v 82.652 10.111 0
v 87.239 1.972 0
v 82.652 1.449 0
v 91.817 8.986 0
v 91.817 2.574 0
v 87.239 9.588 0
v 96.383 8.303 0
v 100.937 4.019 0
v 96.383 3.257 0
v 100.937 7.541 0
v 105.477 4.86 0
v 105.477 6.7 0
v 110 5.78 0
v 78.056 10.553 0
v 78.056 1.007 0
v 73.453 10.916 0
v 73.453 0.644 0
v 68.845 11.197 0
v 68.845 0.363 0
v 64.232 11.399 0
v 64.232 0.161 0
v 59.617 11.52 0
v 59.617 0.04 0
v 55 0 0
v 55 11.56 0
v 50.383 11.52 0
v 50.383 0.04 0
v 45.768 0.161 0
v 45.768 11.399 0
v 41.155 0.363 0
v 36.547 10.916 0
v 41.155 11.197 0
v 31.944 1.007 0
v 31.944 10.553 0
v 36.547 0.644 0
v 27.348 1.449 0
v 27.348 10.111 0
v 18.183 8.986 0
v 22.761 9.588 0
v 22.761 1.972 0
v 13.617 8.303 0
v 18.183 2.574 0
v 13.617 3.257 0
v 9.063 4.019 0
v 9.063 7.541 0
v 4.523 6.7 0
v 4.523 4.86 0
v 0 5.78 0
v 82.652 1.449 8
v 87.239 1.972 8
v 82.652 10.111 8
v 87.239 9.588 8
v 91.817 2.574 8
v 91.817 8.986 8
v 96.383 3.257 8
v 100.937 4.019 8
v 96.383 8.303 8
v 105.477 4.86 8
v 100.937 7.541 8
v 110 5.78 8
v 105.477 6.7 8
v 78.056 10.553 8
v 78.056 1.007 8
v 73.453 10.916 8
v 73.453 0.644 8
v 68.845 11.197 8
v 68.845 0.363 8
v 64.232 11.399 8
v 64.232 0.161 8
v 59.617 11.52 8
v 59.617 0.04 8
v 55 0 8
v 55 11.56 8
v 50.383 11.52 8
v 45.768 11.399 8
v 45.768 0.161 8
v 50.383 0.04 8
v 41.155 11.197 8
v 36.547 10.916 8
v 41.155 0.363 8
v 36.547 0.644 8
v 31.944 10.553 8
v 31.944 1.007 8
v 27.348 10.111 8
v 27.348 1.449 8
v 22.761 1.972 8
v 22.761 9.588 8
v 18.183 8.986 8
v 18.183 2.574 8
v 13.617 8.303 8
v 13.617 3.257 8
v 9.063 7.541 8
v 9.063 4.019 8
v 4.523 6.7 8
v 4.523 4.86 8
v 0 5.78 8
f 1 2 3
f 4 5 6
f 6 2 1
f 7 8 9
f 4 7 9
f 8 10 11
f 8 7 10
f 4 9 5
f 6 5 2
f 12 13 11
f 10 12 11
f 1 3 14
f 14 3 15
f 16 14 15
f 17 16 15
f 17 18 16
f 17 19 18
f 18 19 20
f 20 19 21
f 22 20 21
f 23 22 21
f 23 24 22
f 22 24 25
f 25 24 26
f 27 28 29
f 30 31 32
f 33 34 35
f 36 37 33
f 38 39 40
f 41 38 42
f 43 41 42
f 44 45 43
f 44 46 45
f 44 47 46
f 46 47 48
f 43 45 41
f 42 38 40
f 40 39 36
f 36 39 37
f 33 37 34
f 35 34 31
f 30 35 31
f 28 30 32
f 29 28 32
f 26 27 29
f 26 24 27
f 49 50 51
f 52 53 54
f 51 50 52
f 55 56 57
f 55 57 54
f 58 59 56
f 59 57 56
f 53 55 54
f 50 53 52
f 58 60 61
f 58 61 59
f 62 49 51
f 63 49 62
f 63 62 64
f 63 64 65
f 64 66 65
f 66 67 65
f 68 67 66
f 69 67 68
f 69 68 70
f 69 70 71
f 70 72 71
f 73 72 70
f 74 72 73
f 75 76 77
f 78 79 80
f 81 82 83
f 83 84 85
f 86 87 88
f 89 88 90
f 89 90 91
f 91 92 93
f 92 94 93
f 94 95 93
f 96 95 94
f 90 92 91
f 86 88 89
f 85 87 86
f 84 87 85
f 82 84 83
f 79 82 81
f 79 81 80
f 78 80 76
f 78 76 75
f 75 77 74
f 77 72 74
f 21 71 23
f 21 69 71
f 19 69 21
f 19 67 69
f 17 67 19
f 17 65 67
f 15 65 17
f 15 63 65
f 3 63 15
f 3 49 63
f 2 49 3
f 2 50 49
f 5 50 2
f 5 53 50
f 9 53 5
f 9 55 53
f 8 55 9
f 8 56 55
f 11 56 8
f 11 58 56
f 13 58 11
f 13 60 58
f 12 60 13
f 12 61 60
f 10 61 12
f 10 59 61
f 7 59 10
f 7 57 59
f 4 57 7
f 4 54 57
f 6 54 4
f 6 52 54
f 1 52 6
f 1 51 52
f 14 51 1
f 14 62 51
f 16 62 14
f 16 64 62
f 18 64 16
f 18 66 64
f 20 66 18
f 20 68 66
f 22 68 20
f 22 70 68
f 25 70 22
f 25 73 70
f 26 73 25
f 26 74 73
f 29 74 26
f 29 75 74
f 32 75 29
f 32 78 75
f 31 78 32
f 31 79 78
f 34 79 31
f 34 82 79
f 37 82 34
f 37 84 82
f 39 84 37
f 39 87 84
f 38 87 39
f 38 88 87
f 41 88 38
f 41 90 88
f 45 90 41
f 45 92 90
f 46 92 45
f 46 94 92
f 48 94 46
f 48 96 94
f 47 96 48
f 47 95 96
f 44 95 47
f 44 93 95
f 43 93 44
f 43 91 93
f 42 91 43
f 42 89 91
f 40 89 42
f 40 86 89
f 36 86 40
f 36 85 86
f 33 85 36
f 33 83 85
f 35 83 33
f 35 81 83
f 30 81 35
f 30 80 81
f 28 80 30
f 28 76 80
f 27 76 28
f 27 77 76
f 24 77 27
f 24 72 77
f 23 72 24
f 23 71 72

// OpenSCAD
$fn = 32;

// ----------------------------------------------------------------------
// Arc profile plate: lens, 48 points
// ----------------------------------------------------------------------

// --- parameters (mm) ---
lens_chord = 110;         // chord length of the lens, X
arc_r = 264.54;           // radius of both arcs
arc_angle = 24;           // angle of each arc, degrees
sagitta = 5.78;           // bulge of each arc (half the lens height)
arc_step = 1;             // sampling step of the arcs, degrees
plate_t = 8;              // plate thickness, Z
fit_tol = 0.02;           // declared fit tolerance (prompt contract)
free_tol = 0.2;           // declared free tolerance (prompt contract)

bbox_y = 2 * sagitta;  // full lens height

profile = [[110, 5.78], [105.477, 6.7], [100.937, 7.541], [96.383, 8.303], [91.817, 8.986], [87.239, 9.588], [82.652, 10.111], [78.056, 10.553], [73.453, 10.916], [68.845, 11.197], [64.232, 11.399], [59.617, 11.52], [55, 11.56], [50.383, 11.52], [45.768, 11.399], [41.155, 11.197], [36.547, 10.916], [31.944, 10.553], [27.348, 10.111], [22.761, 9.588], [18.183, 8.986], [13.617, 8.303], [9.063, 7.541], [4.523, 6.7], [0, 5.78], [4.523, 4.86], [9.063, 4.019], [13.617, 3.257], [18.183, 2.574], [22.761, 1.972], [27.348, 1.449], [31.944, 1.007], [36.547, 0.644], [41.155, 0.363], [45.768, 0.161], [50.383, 0.04], [55, 0], [59.617, 0.04], [64.232, 0.161], [68.845, 0.363], [73.453, 0.644], [78.056, 1.007], [82.652, 1.449], [87.239, 1.972], [91.817, 2.574], [96.383, 3.257], [100.937, 4.019], [105.477, 4.86]];  // primary outline, 48 points, counter clockwise

// --- the one profile operation ---
linear_extrude(height = plate_t) polygon(points = profile);
